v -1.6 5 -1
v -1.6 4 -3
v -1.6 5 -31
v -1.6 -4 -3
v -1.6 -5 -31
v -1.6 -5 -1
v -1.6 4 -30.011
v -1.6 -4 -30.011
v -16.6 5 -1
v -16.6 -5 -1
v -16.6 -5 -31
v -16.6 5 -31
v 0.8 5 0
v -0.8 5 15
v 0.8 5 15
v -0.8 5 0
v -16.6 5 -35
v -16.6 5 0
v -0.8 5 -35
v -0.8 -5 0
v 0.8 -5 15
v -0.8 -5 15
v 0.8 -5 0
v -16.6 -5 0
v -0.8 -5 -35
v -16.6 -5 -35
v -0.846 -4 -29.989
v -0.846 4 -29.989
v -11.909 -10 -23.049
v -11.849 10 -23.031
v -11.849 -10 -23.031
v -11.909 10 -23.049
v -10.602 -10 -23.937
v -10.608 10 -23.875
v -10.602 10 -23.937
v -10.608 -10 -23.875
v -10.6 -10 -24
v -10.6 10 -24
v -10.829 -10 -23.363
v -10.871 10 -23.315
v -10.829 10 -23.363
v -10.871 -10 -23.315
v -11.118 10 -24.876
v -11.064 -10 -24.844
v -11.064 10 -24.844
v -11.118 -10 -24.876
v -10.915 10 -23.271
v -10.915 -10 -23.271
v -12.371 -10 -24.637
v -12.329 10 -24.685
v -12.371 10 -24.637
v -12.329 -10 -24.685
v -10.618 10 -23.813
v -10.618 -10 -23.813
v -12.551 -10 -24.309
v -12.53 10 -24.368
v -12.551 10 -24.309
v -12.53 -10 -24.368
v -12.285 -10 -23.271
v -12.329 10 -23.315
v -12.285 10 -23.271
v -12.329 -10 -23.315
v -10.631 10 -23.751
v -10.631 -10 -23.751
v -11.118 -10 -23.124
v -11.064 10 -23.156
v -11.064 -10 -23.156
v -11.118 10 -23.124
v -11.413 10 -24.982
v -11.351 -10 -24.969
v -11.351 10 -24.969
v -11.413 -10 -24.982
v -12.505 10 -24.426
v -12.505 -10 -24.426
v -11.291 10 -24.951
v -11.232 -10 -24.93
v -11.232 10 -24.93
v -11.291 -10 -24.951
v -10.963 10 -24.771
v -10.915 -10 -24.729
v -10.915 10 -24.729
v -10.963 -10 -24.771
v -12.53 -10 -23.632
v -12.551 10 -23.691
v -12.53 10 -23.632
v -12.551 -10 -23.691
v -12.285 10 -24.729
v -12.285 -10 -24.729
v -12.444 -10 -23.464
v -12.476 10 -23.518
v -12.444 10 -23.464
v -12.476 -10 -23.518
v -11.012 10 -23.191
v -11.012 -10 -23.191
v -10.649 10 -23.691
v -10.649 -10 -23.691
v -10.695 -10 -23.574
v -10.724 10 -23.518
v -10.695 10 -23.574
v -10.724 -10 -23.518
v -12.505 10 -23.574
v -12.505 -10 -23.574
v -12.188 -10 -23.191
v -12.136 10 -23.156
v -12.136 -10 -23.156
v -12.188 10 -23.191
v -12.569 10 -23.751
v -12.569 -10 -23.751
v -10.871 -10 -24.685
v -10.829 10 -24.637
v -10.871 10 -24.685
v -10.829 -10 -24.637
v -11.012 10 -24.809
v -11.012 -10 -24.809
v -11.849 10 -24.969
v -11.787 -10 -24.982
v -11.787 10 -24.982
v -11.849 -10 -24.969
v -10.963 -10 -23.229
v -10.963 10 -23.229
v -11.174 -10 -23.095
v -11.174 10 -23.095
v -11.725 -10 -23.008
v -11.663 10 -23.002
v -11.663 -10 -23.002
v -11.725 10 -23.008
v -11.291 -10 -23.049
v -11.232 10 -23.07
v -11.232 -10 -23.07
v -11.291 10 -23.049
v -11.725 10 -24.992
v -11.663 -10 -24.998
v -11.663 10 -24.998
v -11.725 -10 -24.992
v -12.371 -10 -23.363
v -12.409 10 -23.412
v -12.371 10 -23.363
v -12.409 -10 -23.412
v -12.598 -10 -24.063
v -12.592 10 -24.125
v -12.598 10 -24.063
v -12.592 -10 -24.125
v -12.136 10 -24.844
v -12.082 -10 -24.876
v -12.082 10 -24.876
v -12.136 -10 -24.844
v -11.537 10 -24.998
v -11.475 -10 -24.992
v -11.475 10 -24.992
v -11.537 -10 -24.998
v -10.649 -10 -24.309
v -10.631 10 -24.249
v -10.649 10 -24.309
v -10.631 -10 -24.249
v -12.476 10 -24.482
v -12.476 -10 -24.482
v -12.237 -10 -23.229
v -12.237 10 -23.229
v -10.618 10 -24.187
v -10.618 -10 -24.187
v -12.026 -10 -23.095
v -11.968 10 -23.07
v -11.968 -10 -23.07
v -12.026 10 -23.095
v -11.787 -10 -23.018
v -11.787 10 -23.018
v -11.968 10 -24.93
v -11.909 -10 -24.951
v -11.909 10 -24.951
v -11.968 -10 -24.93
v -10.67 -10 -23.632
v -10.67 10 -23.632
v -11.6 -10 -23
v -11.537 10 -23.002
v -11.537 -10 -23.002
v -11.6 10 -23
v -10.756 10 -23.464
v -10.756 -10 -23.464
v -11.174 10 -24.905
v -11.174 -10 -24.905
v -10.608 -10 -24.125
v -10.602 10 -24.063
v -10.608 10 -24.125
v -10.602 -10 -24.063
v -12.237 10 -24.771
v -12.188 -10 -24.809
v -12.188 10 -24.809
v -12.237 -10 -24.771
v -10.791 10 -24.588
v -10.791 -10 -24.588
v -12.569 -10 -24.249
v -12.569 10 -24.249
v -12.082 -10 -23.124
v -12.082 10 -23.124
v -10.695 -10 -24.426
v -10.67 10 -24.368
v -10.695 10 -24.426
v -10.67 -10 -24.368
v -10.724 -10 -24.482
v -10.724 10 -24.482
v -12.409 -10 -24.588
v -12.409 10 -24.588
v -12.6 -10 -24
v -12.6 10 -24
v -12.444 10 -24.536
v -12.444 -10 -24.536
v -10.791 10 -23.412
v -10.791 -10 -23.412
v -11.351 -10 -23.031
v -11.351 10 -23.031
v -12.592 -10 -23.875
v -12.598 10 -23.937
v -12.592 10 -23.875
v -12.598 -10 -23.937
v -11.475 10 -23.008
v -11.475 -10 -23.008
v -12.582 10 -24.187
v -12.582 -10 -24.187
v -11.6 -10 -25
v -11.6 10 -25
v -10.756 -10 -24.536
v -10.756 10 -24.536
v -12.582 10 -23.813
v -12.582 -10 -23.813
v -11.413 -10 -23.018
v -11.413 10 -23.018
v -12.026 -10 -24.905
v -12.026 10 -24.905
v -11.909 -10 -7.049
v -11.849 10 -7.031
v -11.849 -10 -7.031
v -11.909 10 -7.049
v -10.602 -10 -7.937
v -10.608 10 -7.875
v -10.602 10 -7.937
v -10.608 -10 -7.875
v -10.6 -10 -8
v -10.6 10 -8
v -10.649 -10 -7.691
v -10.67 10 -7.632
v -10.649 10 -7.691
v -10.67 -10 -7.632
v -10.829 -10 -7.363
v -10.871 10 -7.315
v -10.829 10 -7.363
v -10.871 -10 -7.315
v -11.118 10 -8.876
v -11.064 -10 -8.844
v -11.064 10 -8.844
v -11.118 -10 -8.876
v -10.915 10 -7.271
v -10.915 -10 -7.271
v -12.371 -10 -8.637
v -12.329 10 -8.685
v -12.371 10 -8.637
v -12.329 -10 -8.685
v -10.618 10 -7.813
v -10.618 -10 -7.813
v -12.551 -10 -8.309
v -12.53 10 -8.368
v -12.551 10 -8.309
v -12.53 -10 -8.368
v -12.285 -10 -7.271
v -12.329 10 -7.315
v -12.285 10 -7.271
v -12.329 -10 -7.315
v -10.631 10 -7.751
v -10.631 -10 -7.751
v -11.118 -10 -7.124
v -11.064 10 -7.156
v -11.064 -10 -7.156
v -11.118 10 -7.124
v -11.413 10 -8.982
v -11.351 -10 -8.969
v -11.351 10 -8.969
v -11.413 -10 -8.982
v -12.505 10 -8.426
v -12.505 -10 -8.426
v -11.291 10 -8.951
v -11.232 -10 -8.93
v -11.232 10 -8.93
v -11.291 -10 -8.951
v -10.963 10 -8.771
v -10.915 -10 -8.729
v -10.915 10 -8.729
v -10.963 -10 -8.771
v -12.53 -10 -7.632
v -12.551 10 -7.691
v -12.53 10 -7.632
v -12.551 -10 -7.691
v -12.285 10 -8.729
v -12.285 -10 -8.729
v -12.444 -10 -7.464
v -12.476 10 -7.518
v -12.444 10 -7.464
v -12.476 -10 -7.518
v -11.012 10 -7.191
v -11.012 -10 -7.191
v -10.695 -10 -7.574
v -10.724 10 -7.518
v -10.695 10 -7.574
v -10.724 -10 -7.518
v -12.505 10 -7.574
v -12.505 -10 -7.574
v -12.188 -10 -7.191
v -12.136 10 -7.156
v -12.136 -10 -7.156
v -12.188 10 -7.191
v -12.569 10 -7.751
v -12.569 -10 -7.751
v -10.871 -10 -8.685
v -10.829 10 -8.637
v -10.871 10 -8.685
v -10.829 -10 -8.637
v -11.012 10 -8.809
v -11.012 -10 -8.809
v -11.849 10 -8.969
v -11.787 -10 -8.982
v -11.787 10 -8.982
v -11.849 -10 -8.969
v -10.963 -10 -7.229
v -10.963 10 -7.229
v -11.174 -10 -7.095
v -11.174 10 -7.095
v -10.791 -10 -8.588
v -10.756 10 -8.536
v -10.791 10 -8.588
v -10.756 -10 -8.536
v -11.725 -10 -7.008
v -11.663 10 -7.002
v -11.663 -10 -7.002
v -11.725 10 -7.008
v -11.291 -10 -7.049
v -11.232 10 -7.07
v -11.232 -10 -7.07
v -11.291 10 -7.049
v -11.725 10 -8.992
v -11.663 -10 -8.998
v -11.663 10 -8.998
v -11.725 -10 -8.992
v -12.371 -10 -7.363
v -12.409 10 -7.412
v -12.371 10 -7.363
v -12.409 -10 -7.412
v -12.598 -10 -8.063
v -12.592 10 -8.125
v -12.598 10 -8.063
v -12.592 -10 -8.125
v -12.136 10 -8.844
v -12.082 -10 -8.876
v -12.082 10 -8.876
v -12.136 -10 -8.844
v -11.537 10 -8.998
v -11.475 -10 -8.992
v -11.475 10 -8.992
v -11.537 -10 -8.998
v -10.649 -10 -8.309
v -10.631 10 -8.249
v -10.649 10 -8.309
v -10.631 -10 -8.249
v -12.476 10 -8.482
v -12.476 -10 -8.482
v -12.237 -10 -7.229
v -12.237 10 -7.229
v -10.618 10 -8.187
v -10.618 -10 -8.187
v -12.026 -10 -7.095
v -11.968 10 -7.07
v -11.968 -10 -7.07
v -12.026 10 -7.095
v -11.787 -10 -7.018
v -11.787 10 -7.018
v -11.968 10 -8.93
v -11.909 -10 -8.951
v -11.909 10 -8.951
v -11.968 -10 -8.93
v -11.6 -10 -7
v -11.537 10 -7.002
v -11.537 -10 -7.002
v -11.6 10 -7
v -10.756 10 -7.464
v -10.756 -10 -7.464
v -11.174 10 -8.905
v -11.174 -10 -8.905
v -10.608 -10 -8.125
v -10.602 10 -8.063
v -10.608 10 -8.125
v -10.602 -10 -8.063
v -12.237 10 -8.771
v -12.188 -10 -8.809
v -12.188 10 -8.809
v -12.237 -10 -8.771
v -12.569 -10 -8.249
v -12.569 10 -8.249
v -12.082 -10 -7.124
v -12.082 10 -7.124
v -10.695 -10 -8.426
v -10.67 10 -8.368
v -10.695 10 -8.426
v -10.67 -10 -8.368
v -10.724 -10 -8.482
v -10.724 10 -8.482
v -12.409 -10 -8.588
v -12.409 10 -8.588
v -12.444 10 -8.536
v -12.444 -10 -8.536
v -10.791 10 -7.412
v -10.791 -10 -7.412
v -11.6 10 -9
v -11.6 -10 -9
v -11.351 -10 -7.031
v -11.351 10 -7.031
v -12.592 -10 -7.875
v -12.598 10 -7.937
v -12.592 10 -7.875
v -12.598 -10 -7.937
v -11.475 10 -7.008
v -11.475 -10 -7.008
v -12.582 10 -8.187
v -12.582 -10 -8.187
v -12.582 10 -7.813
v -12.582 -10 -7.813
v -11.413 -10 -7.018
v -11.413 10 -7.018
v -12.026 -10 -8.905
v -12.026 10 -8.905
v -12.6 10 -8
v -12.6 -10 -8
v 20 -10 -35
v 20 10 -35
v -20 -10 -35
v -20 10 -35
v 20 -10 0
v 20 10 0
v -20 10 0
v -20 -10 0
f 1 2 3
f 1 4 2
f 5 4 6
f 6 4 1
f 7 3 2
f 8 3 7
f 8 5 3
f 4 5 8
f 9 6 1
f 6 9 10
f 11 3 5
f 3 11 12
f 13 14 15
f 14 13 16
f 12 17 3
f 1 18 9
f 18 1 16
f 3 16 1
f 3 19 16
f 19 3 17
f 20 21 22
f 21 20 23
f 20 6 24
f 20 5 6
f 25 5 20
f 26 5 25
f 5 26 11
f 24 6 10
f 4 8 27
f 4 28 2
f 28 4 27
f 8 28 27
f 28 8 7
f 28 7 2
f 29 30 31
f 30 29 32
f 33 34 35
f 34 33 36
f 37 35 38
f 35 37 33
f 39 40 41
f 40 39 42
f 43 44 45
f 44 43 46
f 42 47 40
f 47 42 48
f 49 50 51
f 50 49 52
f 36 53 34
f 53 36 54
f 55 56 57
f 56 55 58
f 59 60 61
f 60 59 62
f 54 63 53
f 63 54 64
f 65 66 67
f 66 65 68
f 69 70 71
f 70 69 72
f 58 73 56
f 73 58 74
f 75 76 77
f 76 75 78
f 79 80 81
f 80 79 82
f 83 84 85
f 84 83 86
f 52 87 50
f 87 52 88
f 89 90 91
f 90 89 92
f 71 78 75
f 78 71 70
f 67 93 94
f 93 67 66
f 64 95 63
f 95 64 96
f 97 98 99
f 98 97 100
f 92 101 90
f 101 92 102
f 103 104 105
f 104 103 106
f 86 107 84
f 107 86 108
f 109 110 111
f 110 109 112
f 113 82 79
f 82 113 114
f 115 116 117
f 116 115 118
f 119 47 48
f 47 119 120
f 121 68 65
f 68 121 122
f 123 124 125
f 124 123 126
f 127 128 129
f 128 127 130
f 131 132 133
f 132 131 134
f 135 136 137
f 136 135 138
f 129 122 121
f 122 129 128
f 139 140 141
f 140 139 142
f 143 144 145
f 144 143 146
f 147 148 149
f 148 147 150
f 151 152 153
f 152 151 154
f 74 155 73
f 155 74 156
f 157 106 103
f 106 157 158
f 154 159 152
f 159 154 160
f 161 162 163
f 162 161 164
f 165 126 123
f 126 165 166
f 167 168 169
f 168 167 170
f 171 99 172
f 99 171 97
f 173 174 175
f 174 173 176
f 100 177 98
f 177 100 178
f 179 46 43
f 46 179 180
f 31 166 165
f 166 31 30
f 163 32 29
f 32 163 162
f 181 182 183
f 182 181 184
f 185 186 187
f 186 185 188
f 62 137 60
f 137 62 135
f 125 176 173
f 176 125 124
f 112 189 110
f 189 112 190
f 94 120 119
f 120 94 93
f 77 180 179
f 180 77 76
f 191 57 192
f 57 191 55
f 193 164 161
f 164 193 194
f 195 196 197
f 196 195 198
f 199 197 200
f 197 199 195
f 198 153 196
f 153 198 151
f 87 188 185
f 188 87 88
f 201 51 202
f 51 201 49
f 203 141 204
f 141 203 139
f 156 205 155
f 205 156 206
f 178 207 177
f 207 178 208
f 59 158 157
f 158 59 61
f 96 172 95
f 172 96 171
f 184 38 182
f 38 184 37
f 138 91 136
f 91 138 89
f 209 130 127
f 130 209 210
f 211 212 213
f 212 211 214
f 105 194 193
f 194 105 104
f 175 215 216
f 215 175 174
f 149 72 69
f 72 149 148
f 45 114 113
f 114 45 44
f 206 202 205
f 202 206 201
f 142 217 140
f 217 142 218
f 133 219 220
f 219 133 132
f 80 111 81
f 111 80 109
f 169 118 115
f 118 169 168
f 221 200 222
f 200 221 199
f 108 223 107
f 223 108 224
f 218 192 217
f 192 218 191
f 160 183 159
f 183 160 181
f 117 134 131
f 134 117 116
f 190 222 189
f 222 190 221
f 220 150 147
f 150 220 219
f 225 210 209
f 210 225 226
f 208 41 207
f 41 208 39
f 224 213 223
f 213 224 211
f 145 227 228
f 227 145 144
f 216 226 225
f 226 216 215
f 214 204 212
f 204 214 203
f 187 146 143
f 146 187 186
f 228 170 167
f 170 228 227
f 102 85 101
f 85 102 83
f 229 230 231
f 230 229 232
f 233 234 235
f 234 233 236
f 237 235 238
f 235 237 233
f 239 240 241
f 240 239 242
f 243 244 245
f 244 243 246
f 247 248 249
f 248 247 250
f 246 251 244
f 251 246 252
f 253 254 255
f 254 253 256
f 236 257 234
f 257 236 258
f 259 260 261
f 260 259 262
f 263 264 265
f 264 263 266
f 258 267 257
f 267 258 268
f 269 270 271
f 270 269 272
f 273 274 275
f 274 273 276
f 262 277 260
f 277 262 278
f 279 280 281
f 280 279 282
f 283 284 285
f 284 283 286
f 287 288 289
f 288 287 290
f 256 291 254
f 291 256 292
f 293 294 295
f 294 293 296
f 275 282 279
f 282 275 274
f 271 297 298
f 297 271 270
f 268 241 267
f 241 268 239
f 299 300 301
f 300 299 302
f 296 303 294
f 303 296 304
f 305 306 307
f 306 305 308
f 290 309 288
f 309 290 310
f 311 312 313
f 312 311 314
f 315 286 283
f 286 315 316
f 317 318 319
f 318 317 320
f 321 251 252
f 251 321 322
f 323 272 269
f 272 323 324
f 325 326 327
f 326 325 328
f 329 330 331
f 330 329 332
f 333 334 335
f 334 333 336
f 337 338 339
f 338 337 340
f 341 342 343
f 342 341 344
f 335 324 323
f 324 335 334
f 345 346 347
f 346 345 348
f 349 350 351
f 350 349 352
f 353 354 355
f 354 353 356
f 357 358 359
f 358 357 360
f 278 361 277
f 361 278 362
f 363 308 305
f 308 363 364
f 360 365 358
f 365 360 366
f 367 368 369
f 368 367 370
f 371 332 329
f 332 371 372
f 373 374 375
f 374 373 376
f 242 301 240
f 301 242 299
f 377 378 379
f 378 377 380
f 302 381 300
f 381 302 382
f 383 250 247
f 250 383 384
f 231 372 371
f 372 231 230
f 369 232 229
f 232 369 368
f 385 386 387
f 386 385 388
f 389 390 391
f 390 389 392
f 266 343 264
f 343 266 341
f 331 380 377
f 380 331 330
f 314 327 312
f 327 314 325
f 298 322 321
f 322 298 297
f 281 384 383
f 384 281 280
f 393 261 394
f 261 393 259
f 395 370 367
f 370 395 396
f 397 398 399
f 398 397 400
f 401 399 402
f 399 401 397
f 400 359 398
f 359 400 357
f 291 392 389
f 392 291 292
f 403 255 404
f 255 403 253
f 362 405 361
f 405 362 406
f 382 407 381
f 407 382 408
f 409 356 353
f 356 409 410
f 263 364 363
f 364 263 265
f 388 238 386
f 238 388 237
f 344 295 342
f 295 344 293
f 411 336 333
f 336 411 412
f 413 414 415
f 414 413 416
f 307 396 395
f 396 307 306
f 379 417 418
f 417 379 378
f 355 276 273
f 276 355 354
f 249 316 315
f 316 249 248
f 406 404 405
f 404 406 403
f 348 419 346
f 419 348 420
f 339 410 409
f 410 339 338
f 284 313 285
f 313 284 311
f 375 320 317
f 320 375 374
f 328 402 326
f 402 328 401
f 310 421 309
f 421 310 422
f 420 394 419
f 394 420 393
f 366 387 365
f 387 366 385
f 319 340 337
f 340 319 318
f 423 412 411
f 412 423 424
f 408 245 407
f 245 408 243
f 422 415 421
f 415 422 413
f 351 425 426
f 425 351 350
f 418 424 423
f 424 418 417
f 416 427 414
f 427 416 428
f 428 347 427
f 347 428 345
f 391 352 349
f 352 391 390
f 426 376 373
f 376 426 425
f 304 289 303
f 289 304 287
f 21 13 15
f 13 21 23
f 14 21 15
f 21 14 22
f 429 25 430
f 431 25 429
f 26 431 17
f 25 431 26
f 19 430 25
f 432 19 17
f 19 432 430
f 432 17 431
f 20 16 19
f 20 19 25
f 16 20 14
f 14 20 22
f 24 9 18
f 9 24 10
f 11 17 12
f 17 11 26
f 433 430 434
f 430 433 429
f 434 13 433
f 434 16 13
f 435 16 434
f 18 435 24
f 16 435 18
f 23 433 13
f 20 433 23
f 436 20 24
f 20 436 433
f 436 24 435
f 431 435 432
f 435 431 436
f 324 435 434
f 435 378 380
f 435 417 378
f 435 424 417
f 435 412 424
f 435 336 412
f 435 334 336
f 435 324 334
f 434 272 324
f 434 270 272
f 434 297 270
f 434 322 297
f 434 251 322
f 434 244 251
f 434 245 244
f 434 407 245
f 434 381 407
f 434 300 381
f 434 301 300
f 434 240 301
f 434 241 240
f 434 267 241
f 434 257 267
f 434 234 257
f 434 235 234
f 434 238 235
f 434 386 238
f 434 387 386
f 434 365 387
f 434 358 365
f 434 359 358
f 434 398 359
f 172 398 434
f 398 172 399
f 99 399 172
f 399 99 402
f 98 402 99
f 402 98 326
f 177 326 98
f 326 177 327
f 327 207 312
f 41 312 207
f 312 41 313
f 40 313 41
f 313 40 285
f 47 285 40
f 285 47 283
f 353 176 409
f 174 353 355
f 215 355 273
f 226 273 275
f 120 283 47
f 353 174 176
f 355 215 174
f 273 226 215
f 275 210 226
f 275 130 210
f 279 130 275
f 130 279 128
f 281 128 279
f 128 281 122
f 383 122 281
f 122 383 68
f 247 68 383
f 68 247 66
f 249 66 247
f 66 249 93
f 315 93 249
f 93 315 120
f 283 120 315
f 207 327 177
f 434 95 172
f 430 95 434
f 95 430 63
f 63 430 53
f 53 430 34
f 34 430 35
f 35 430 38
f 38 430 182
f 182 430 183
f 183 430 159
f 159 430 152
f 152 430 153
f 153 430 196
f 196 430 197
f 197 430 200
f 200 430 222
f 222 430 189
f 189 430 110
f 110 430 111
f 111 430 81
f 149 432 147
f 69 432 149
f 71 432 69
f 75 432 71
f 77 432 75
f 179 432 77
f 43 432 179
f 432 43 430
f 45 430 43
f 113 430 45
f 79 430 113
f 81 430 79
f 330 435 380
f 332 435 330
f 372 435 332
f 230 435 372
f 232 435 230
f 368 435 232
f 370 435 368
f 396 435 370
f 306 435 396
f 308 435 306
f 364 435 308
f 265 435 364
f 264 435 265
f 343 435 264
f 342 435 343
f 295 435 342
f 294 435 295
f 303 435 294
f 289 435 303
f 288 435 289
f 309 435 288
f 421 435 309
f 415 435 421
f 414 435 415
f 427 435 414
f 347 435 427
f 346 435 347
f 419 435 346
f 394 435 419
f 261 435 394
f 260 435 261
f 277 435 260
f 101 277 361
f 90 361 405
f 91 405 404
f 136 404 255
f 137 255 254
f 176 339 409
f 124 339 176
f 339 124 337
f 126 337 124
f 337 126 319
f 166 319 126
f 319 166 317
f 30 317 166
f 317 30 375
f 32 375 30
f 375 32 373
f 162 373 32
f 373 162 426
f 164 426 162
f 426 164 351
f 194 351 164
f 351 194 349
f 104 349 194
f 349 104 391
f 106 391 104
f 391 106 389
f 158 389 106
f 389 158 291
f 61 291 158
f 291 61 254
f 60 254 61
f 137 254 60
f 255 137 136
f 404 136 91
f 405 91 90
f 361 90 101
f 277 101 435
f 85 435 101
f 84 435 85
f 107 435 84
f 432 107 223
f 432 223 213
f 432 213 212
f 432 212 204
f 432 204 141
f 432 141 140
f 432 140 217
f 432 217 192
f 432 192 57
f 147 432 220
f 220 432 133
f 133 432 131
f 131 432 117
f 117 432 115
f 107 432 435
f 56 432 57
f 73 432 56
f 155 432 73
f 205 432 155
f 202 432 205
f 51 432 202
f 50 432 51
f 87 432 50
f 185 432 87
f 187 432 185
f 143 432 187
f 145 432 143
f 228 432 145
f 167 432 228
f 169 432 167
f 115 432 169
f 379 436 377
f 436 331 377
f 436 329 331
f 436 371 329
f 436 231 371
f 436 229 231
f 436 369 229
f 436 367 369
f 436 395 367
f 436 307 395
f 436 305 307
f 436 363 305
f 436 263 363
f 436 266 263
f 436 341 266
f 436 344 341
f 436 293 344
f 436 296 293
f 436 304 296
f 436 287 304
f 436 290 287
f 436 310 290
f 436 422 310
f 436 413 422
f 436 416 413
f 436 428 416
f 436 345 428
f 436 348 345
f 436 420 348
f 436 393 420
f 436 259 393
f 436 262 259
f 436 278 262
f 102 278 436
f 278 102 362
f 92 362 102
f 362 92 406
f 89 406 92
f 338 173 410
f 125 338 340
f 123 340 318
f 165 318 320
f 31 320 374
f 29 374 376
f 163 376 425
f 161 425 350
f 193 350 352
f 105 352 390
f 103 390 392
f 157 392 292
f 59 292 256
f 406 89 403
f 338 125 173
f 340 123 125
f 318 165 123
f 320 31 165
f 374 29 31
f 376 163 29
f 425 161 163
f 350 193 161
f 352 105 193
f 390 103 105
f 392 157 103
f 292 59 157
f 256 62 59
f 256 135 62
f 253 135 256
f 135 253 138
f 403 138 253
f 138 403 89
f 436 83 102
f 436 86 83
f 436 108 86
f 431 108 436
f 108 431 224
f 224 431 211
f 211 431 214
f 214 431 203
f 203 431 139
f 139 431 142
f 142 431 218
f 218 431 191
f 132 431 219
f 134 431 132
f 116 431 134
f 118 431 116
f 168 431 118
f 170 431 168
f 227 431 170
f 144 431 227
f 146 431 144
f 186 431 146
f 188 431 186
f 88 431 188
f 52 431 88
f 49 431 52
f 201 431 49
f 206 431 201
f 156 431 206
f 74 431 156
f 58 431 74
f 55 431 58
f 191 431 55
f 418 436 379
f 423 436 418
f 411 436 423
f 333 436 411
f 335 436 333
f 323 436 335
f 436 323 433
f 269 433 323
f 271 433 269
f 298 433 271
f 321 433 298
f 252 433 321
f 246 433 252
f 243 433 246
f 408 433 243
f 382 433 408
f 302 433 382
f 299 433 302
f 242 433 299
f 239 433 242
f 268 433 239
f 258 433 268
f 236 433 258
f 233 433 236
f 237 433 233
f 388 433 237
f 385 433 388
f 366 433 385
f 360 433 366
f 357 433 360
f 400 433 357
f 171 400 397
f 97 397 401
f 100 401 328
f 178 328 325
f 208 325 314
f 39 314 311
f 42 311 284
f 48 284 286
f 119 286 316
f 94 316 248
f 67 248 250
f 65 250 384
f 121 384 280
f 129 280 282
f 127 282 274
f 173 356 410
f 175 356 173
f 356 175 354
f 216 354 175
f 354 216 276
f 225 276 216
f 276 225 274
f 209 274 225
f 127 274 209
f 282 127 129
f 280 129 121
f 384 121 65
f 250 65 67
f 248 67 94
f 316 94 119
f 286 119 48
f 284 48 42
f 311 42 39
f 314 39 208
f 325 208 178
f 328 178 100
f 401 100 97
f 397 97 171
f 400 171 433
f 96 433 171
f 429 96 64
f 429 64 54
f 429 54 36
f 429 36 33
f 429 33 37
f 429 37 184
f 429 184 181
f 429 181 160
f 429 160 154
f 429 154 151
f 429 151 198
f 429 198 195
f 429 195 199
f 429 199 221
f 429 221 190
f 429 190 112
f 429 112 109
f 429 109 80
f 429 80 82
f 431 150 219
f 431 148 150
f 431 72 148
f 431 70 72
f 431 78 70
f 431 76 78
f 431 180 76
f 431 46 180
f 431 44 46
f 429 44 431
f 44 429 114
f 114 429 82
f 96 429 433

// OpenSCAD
$fn=100;

hole_d = 15;
hole_h = 1.5;

bumper_h = 30;
bumper_x_pulled = 20;
bumper_x_pushed = 15;
bumper_y = 10;
bumper_l = bumper_h - 3;

bumper_screw_d = 2;
bumper_screw_x = 5;
bumper_screws_h = [7, 23];

opened = abs($t*2-1);
opened = 0.15;

PCB_thick = 1.6;
PCB_width = 10;

bumper_pos = -bumper_x_pushed - PCB_thick;

module bumper_screws() {
    translate([bumper_pos, 0, -bumper_h-1])
    for(h = bumper_screws_h) {
        translate([bumper_screw_x, 0, h]) rotate([90,0])
        cylinder(d=bumper_screw_d, h=30, center=true);
    }
}
module bumper() {
    difference() {
        translate([bumper_pos, -bumper_y/2, -bumper_h-1])
        union() {
            cube([bumper_x_pushed, bumper_y, bumper_h]);
            
            translate([bumper_x_pushed, bumper_y *0.1, bumper_h-2])
            rotate([
                0, 
                opened*asin((bumper_x_pushed-bumper_x_pulled)/bumper_l), 
            ]) 
            translate([-1,0, -bumper_l])
            cube([1, bumper_y *0.8, bumper_l]);
        }
        bumper_screws();
    }
}
module plaque() {
    difference() {
        translate([0, 0, hole_h/2]) cube([80, 80, hole_h], center=true);
        translate([0, 0, -1]) cylinder(d=hole_d, h=10);
    }
}
module PCB() {
    translate([0, 0, -10])
    cube([PCB_thick, PCB_width, 50], center=true);
}

module negative_real() {
        bumper();
    //plaque();
    PCB();
}


module real() {
    difference() {
        union() {
            translate([-40/2, -20/2, -35])
            cube([40, 20, 35]);
            
        }
        union() {
            translate([bumper_pos, -bumper_y/2, -50])
            cube([-bumper_pos, bumper_y, 51]);
            #bumper_screws();
        }
    }
}
#negative_real();
real();
